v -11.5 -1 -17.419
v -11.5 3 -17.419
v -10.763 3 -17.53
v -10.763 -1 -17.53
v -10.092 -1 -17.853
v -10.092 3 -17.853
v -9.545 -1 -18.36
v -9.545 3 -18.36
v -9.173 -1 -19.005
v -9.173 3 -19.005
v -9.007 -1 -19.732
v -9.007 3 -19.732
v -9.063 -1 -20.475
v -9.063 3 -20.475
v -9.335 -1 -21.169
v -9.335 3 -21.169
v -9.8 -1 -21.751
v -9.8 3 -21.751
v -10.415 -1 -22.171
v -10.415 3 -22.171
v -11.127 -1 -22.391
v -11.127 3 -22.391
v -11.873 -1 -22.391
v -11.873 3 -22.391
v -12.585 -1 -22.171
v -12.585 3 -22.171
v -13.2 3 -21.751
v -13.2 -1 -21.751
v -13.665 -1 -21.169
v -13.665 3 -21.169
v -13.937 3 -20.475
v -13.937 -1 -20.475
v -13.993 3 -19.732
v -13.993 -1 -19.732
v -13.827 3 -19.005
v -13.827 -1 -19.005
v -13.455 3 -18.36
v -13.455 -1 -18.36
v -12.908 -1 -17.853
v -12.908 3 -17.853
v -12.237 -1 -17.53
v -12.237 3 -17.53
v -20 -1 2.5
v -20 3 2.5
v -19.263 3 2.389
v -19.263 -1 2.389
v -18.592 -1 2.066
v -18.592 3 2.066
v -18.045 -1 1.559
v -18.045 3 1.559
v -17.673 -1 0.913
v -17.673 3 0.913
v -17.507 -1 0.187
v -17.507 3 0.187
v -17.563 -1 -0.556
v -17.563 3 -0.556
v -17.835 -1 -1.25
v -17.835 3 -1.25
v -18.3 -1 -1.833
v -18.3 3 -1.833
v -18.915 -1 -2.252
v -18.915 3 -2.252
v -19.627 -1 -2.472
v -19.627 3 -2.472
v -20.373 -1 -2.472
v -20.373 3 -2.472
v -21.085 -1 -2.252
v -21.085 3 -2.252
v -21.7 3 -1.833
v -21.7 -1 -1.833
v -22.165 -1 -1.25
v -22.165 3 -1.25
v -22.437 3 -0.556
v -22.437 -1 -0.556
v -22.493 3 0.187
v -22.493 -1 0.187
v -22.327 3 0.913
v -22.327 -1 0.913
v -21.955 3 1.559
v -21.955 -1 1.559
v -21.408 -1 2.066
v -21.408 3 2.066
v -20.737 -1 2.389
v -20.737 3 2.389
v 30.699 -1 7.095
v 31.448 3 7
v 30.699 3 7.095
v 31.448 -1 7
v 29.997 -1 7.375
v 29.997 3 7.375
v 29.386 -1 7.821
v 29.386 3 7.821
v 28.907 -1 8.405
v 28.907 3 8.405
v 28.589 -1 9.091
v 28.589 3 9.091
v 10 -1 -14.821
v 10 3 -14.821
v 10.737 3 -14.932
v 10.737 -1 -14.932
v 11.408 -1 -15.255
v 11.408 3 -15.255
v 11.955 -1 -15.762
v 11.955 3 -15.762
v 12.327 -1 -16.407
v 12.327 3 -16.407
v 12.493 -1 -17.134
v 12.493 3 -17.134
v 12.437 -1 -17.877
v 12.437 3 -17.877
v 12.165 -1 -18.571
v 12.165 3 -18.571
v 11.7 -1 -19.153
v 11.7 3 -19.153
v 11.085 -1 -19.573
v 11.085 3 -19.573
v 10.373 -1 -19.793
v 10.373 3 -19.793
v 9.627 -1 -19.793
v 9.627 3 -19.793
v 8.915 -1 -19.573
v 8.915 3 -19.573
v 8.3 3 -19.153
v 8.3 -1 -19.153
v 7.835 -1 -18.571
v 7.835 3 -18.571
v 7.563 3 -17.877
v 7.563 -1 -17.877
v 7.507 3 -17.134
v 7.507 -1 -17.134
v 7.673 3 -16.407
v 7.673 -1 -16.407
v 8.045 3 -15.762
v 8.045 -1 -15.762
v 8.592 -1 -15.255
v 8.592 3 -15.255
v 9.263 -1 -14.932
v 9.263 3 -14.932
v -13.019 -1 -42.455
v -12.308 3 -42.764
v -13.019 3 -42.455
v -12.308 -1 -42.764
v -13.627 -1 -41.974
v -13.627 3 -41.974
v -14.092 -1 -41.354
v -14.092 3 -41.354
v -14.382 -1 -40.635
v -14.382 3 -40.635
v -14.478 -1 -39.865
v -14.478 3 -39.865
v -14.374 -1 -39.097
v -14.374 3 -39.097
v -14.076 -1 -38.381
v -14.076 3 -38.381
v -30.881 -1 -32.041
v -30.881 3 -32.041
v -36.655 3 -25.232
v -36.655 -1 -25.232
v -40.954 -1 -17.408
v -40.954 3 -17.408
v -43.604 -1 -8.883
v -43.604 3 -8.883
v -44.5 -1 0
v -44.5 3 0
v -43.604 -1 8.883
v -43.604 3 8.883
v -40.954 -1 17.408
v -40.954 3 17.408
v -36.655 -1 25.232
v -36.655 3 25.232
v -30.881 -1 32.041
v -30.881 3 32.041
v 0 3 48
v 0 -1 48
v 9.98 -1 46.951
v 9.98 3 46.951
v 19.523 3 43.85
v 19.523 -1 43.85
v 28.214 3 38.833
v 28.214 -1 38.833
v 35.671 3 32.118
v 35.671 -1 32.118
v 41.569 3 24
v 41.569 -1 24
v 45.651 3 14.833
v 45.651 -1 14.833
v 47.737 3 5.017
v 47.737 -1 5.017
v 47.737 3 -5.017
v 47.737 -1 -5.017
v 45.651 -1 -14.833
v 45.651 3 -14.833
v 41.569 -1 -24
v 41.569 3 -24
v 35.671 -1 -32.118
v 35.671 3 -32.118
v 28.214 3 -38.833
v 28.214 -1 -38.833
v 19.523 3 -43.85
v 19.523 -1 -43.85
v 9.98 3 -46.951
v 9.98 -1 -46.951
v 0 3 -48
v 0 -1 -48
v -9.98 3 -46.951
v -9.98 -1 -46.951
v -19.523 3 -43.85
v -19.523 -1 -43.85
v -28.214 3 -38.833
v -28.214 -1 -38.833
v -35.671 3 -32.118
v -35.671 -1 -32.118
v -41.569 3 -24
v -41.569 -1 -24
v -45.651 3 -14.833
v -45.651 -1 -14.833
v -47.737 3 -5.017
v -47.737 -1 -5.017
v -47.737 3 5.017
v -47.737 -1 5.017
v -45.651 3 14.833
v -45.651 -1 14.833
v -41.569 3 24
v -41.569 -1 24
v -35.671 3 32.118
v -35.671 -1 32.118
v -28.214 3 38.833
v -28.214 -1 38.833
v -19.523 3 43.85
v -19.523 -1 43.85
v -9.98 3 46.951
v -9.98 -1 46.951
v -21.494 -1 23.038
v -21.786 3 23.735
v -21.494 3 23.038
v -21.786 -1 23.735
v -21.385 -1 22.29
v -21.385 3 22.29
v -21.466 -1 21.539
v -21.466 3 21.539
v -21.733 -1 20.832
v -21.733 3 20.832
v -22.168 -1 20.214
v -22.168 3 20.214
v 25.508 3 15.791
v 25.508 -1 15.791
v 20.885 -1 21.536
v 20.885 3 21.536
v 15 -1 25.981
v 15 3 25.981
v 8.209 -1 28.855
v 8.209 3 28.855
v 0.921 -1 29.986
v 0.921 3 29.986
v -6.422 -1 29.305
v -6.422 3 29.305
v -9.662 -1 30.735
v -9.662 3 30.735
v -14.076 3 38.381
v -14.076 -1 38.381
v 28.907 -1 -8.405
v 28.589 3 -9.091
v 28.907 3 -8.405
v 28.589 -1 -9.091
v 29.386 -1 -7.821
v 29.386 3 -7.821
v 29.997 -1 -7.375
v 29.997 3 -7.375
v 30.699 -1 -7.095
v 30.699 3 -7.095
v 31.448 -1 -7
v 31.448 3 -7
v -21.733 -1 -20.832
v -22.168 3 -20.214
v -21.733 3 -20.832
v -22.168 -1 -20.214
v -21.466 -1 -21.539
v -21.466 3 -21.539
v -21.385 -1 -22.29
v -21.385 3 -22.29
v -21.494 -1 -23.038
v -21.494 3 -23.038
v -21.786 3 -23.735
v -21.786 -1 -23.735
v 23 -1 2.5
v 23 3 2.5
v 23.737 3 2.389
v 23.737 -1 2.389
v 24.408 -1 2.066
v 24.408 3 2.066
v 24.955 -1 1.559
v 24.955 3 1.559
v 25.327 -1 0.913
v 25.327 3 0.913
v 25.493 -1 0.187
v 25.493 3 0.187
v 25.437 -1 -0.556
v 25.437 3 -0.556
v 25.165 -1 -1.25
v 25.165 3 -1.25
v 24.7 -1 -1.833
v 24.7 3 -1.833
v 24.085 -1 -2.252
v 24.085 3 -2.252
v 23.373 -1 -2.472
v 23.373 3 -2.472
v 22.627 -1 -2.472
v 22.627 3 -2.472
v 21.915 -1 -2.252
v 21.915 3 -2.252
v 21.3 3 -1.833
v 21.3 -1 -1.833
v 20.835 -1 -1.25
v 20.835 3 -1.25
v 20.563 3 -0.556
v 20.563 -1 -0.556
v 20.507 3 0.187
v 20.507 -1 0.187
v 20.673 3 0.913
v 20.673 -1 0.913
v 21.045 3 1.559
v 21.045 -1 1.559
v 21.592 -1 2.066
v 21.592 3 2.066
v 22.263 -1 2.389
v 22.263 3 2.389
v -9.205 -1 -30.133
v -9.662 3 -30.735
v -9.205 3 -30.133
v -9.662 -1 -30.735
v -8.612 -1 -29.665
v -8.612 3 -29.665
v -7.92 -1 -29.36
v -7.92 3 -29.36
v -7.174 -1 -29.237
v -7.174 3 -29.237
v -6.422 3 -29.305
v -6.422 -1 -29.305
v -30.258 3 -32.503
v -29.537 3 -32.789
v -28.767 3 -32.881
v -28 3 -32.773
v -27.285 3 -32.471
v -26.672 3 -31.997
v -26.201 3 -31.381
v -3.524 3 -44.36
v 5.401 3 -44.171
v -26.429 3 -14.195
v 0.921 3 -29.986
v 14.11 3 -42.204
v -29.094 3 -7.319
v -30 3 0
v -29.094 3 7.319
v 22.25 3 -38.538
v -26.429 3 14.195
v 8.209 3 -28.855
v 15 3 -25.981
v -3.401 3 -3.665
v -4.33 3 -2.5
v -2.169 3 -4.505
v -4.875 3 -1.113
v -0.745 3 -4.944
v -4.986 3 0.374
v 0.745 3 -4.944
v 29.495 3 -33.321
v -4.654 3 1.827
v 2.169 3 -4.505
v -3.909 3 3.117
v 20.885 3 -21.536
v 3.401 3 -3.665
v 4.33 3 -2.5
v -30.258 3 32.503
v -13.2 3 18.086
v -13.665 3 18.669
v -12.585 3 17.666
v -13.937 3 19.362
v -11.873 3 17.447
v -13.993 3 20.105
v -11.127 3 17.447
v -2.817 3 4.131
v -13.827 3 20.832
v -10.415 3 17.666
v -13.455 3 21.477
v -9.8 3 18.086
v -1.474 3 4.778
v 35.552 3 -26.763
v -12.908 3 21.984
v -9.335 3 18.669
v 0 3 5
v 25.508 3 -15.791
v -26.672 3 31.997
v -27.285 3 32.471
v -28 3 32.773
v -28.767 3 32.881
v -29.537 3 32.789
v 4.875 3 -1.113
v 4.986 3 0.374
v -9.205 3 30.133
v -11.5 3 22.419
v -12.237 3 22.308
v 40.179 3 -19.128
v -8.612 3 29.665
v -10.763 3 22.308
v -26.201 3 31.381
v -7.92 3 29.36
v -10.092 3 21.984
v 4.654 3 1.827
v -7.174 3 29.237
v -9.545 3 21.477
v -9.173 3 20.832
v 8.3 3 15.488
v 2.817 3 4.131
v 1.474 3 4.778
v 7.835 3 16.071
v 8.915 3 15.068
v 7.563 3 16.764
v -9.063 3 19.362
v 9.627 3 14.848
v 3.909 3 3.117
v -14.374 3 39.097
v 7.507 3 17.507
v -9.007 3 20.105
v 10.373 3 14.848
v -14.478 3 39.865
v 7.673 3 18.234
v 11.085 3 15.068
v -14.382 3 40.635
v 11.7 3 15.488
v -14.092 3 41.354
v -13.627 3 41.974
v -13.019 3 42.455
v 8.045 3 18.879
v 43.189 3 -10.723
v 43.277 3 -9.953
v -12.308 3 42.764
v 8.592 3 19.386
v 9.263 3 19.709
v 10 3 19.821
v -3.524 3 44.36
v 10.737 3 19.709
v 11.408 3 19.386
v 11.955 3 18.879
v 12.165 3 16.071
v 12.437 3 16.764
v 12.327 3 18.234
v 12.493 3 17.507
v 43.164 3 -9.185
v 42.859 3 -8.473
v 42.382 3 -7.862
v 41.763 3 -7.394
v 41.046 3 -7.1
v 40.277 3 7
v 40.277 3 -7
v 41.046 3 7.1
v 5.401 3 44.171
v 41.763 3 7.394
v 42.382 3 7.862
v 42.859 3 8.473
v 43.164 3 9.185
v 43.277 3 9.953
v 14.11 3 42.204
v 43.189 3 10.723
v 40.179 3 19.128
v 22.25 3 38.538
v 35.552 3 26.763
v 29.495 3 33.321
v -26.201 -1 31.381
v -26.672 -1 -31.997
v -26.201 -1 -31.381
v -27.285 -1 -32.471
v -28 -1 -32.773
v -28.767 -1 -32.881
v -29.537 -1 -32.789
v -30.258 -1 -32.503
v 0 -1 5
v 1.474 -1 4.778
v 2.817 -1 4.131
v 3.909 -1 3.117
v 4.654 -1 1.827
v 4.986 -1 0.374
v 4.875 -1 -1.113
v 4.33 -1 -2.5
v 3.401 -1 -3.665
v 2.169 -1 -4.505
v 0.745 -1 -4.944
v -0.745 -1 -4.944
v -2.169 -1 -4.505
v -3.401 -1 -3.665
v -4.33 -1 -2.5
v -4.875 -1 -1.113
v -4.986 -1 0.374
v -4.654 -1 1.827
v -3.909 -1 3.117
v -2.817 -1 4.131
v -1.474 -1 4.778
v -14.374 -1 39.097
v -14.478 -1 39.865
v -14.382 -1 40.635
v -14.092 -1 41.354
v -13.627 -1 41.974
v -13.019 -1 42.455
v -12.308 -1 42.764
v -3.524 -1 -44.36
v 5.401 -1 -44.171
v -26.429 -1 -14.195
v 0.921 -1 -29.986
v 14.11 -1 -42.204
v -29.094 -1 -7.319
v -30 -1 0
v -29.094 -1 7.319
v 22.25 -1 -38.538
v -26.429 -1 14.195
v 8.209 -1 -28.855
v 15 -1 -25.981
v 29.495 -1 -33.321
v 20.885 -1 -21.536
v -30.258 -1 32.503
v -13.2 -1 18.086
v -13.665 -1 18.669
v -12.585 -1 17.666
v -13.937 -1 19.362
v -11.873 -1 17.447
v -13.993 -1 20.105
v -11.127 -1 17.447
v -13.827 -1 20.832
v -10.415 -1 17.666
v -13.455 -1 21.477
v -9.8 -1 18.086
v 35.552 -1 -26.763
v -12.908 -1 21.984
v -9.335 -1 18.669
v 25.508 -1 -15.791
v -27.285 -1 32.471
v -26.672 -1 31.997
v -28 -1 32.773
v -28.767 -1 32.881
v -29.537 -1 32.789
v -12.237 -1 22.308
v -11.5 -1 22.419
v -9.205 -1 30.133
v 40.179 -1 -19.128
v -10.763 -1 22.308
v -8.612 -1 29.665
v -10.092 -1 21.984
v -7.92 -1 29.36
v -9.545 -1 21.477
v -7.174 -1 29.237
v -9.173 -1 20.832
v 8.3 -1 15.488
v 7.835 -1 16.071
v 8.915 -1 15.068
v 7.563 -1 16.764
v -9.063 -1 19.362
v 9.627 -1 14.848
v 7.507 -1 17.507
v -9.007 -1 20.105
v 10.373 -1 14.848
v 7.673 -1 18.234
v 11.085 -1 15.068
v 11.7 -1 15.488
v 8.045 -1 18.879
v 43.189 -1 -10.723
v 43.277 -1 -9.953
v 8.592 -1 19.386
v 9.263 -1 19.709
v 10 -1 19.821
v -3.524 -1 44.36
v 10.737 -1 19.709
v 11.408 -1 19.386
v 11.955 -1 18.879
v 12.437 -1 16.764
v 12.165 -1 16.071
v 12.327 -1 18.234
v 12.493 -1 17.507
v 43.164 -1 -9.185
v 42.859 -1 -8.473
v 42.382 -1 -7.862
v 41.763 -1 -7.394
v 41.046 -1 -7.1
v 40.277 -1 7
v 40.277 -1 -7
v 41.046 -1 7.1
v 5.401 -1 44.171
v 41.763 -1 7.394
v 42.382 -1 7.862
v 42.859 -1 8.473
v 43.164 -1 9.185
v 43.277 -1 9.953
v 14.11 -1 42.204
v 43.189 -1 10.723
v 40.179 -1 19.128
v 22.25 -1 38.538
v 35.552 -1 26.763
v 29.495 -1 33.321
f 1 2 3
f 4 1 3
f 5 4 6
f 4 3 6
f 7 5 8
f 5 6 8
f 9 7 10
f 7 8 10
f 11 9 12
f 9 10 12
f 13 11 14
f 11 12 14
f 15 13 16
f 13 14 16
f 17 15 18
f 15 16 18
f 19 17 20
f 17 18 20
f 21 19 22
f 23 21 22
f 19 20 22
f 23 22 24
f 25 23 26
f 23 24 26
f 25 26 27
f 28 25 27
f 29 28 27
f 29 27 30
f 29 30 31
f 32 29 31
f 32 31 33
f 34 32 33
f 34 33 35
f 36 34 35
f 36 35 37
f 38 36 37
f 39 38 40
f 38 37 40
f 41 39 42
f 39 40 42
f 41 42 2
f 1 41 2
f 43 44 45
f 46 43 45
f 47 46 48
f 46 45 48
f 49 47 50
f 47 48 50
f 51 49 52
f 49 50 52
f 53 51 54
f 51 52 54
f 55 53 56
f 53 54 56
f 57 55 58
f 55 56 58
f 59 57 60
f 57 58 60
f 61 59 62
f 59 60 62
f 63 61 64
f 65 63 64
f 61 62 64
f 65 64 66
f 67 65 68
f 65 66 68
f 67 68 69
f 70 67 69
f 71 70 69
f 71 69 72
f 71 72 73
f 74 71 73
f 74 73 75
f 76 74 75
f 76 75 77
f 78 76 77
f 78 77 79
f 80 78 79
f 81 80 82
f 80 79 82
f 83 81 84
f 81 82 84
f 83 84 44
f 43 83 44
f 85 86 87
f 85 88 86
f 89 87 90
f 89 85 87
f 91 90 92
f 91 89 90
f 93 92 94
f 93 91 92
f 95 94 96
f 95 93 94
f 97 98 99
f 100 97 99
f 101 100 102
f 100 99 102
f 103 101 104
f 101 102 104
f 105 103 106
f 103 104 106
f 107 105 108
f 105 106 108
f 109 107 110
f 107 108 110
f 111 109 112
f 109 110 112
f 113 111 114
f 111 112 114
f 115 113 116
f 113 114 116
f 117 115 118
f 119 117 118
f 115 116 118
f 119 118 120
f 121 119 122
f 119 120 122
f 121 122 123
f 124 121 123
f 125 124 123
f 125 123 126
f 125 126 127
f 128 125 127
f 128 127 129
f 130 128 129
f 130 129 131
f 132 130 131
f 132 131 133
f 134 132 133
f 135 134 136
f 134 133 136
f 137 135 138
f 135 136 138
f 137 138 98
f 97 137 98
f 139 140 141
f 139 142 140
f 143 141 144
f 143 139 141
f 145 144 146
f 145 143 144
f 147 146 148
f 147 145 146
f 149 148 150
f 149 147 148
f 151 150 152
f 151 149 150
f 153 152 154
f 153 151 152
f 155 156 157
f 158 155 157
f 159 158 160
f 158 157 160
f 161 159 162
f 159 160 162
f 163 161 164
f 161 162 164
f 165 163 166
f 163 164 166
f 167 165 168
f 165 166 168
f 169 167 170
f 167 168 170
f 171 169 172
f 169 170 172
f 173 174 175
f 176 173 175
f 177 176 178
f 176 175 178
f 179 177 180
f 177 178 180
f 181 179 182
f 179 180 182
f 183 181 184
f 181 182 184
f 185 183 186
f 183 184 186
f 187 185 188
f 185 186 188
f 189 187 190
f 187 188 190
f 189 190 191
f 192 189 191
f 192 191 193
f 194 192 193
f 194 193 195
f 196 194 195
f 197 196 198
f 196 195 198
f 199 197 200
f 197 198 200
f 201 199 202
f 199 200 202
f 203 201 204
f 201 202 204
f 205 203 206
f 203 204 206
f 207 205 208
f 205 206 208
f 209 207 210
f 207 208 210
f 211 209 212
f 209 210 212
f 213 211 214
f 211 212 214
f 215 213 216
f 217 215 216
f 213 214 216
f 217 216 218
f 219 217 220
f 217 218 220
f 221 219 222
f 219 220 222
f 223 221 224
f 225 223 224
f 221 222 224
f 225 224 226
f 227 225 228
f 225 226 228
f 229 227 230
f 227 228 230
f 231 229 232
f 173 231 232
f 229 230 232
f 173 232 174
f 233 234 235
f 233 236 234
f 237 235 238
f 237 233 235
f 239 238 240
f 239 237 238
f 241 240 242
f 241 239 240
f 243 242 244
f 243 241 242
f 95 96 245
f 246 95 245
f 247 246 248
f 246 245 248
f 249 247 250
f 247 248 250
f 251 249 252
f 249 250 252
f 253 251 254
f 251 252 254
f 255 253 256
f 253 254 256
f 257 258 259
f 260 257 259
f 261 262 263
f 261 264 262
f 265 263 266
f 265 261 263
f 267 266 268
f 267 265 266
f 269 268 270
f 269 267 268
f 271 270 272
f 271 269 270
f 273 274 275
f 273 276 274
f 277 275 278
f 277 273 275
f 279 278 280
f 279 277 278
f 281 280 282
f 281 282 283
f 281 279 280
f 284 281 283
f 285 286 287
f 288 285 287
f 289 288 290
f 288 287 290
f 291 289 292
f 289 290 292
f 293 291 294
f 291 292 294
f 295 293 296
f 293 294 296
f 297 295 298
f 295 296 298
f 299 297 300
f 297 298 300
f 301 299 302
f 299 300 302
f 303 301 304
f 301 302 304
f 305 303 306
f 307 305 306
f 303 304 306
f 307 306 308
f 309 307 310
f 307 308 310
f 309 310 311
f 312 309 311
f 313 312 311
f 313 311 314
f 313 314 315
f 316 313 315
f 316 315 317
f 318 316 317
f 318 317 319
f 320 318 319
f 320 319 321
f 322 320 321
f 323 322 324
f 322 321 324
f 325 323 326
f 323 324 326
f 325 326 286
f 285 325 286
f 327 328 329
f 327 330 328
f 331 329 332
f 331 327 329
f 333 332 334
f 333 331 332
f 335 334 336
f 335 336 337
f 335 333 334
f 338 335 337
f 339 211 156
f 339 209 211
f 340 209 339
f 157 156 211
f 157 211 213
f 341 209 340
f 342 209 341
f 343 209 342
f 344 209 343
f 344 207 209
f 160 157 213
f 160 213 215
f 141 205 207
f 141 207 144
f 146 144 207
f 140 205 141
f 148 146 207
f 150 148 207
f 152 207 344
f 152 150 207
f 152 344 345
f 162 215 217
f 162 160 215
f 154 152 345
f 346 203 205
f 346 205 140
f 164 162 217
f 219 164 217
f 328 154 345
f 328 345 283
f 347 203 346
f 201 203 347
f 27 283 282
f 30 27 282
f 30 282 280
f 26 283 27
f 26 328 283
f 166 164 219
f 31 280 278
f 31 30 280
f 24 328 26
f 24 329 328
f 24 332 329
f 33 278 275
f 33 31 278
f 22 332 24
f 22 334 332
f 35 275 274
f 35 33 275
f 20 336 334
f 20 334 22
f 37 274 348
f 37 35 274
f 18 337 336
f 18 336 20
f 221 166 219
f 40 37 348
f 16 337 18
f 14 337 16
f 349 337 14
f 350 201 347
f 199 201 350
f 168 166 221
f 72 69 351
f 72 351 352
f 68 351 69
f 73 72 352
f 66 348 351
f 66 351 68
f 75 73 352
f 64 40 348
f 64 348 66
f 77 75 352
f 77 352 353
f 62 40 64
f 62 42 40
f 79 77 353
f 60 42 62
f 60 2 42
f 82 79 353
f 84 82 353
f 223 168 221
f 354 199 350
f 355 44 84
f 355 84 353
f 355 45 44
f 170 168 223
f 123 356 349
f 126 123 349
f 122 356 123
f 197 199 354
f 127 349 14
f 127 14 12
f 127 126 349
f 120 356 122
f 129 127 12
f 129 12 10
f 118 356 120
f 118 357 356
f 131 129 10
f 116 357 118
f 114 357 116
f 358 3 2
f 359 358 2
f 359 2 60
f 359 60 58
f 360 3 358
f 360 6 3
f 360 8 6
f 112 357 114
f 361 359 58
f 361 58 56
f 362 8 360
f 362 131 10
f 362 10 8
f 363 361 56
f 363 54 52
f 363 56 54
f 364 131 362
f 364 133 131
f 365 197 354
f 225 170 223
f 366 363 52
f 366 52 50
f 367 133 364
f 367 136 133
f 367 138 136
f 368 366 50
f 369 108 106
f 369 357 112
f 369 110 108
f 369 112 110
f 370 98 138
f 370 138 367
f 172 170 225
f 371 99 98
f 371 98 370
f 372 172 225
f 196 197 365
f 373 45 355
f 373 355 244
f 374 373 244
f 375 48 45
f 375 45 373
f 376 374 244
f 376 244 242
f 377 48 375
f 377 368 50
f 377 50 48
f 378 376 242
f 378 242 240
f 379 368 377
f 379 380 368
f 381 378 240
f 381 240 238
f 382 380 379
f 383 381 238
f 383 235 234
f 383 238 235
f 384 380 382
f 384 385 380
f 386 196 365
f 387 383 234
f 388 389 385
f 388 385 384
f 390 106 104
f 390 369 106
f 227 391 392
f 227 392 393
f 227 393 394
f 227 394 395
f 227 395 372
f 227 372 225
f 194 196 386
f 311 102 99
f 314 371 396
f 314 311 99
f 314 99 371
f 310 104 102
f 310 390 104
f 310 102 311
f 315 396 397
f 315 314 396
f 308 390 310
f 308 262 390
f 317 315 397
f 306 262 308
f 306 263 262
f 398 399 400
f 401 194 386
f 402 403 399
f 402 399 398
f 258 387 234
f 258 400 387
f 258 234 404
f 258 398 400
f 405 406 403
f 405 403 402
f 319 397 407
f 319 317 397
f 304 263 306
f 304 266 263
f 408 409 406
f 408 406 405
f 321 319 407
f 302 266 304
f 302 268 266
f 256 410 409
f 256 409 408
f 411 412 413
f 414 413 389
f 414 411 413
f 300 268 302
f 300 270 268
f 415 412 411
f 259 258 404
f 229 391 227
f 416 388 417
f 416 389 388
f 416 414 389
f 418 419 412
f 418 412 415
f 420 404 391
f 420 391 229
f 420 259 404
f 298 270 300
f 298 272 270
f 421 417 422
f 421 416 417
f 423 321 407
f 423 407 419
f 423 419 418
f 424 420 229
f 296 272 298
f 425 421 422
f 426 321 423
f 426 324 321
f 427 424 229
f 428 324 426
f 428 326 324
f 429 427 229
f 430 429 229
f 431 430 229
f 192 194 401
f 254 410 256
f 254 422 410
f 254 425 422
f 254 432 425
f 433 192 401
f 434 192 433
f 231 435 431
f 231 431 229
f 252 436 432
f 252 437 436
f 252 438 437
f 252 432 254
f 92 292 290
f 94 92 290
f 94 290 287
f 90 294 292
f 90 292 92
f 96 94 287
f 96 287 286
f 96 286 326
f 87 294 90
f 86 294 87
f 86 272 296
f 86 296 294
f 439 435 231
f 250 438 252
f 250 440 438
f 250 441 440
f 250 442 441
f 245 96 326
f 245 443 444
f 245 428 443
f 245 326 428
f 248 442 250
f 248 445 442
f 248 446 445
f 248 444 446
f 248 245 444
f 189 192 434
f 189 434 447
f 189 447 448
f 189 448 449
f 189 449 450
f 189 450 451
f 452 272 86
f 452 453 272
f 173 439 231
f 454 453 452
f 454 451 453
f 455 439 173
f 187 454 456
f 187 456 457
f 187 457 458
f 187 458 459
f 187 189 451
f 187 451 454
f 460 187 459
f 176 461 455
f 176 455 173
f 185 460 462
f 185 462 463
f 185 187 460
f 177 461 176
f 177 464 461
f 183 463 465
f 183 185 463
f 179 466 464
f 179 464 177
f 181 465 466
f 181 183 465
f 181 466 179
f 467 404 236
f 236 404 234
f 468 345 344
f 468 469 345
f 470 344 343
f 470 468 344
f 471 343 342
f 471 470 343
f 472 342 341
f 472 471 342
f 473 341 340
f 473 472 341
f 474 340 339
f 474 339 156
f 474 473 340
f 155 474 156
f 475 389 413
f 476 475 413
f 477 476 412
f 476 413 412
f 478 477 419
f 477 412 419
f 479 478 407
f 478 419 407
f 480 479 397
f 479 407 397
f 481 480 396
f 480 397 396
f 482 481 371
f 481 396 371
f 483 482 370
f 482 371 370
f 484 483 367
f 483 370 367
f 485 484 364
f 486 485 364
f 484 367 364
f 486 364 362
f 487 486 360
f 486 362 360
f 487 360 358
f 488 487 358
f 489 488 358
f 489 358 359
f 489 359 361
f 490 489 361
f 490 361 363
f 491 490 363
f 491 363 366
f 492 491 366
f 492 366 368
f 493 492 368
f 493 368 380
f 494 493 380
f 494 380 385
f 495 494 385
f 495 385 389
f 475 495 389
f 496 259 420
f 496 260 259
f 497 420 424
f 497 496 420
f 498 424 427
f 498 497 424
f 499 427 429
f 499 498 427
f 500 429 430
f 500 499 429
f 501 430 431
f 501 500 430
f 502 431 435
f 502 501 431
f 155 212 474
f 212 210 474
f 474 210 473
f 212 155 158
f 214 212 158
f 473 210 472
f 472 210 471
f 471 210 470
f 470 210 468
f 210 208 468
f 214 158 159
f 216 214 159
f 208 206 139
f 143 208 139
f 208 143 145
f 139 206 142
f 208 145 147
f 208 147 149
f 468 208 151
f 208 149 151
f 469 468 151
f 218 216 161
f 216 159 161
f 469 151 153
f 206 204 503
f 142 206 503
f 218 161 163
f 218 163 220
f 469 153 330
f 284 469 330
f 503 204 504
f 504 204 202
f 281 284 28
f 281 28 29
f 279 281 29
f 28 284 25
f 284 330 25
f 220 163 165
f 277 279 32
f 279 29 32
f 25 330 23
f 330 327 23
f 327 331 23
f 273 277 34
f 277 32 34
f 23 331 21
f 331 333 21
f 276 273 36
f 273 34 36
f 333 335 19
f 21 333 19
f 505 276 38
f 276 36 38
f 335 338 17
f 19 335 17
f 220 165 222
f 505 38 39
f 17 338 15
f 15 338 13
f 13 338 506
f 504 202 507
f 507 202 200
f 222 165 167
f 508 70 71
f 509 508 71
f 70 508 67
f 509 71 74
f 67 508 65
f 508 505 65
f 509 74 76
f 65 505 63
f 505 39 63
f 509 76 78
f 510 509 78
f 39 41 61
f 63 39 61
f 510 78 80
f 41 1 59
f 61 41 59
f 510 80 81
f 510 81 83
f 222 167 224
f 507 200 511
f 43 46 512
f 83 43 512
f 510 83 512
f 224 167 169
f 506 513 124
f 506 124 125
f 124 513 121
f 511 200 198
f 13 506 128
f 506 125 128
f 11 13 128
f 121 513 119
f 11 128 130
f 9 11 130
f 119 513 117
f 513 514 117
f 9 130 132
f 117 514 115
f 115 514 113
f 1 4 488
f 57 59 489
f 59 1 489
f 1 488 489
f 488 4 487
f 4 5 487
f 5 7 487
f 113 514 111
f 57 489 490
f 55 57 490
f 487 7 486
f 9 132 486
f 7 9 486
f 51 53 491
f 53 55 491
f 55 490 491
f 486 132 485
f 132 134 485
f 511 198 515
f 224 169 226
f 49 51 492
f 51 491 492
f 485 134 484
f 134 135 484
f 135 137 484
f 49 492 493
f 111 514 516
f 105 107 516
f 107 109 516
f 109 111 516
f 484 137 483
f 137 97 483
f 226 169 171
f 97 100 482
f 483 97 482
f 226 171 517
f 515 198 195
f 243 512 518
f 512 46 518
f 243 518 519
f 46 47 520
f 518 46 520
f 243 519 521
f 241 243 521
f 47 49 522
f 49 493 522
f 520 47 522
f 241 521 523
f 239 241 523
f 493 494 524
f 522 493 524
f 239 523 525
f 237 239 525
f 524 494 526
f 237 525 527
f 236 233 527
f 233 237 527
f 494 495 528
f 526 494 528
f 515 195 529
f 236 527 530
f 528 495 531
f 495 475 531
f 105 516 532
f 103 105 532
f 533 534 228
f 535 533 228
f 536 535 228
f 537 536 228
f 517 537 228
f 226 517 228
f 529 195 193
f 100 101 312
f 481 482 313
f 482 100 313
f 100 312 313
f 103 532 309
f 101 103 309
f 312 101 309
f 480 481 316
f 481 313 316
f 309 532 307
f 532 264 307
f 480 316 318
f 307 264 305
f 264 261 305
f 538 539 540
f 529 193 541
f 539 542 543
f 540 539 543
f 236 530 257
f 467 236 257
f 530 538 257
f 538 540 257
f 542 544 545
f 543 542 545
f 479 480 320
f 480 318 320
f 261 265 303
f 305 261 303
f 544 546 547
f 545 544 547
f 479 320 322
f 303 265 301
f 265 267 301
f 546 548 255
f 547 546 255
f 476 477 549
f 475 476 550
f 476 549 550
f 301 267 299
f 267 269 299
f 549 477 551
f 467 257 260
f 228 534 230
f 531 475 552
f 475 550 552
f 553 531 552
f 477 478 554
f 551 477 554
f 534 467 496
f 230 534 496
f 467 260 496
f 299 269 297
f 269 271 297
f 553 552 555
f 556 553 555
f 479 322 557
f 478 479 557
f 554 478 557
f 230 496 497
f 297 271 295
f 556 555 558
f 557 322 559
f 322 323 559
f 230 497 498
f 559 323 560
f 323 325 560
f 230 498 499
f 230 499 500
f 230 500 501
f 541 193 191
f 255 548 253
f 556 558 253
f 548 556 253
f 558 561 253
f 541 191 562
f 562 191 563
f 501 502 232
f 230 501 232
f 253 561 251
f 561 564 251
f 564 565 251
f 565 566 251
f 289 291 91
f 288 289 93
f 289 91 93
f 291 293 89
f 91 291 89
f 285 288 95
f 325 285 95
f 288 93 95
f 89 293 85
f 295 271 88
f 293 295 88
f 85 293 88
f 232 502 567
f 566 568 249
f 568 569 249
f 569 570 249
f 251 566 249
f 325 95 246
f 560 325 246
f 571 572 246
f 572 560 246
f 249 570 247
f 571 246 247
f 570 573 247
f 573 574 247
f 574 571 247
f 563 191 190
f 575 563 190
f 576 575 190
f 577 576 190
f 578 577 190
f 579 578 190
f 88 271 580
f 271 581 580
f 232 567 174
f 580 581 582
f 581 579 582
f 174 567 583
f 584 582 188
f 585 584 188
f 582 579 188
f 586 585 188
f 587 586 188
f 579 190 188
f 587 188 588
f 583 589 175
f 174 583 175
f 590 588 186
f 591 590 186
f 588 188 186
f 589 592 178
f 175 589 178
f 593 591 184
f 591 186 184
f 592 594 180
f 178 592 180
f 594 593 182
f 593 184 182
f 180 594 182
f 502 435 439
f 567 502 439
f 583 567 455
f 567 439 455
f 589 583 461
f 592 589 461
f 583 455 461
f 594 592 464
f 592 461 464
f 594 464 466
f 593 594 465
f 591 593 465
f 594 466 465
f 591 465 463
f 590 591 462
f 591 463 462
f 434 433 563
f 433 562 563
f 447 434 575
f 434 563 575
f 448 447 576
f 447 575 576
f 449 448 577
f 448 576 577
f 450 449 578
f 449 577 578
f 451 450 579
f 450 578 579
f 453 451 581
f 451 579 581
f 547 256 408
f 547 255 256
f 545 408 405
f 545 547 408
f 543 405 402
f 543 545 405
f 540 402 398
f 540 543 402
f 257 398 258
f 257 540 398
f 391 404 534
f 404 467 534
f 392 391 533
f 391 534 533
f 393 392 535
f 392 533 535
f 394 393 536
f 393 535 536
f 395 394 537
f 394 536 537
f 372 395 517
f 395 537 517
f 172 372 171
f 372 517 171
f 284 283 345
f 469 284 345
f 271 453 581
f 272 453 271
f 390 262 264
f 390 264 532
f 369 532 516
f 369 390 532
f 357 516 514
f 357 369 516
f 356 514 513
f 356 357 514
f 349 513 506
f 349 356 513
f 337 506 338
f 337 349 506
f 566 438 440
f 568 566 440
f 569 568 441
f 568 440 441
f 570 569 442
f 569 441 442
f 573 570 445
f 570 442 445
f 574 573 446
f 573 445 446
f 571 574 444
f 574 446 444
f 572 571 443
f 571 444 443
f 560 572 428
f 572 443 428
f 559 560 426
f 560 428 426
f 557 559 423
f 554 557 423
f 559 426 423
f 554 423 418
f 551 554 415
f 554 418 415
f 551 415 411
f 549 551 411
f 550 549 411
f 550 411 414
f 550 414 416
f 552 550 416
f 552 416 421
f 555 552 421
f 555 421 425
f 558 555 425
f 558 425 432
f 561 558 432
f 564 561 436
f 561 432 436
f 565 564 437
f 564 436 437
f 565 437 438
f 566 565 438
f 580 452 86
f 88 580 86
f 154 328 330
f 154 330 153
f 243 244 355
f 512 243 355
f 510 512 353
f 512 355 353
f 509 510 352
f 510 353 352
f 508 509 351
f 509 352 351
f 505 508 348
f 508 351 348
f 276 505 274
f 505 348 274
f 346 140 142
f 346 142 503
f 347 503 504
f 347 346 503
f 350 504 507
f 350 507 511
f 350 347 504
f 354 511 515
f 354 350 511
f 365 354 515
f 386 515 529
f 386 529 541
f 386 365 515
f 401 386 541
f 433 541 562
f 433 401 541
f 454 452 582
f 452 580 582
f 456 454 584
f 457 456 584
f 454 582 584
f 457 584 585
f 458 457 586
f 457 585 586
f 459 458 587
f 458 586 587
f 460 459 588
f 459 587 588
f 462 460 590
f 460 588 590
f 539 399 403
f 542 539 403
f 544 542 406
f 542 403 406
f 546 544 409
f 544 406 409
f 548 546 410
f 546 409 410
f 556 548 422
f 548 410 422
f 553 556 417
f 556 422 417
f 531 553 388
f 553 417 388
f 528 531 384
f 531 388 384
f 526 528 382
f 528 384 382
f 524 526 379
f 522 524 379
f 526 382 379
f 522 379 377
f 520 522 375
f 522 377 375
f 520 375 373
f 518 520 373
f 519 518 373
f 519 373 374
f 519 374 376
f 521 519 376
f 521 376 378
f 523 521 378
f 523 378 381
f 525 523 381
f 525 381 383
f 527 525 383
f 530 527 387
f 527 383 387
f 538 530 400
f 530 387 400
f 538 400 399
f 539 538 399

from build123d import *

# Parameters (mm, degrees)
SKETCH1_R           = 24
SKETCH1_R_2         = 2
SKETCH1_R_3         = 1.5
BOSS_EXTRUDE1_DEPTH = 2
CUT_EXTRUDE1_DEPTH  = 2
FILLET1_R           = 1.5
SKETCH3_R           = 1.75
CUT_EXTRUDE2_DEPTH  = 10
SCALE1_SCALE        = 2
SKETCH4_R           = 5
CUT_EXTRUDE3_DEPTH  = 10
SKETCH5_R           = 6.547213639
SKETCH5_R_2         = 2.5
SKETCH5_R_3         = 5.064875416
BOSS_EXTRUDE2_DEPTH = 4


with BuildPart() as part:
    # Sketch1 → Boss-Extrude1 (new body)
    with BuildSketch(Plane(origin=(0, 0, 0), x_dir=(1, 0, 0), z_dir=(0, 1, 0))):
        with Locations(Location((0, 0, 0), (0, 0, 270))):
            Circle(SKETCH1_R)
        with Locations(Location((0, 0, 0), (0, 0, 270))):
            Circle(SKETCH1_R_2, mode=Mode.SUBTRACT)
        with Locations(Location((11.5, 0, 0), (0, 0, 270))):
            Circle(SKETCH1_R_3, mode=Mode.SUBTRACT)
        with Locations(Location((-5.75, -9.959292144, 0), (0, 0, 270))):
            Circle(SKETCH1_R_3, mode=Mode.SUBTRACT)
        with Locations(Location((-5.75, 9.959292144, 0), (0, 0, 270))):
            Circle(SKETCH1_R_3, mode=Mode.SUBTRACT)
    extrude(amount=BOSS_EXTRUDE1_DEPTH)

    # Sketch2 → Cut-Extrude1 (cut)
    with BuildSketch(Plane(origin=(0, 2, 0), x_dir=(1, 0, 0), z_dir=(0, 1, 0))):
        with BuildLine():
            Line((21.972994789, 3.5), (14.585952146, 3.5))
            ThreePointArc((14.585952146, 3.5), (7.5, 12.990381057), (-4.26188716, 14.381805097))
            Line((-4.26188716, 14.381805097), (-7.955408481, 20.779171685))
            ThreePointArc((-7.955408481, 20.779171685), (11.125, 19.269065234), (21.972994789, 3.5))
        make_face()
        with BuildLine():
            Line((21.972994789, -3.5), (14.585952146, -3.5))
            ThreePointArc((14.585952146, -3.5), (7.5, -12.990381057), (-4.26188716, -14.381805097))
            Line((-4.26188716, -14.381805097), (-7.955408481, -20.779171685))
            ThreePointArc((-7.955408481, -20.779171685), (11.125, -19.269065234), (21.972994789, -3.5))
        make_face()
        with BuildLine():
            Line((-14.017586308, -17.279171685), (-10.324064986, -10.881805097))
            ThreePointArc((-10.324064986, -10.881805097), (-15, 0), (-10.324064986, 10.881805097))
            Line((-10.324064986, 10.881805097), (-14.017586308, 17.279171685))
            ThreePointArc((-14.017586308, 17.279171685), (-22.25, 0), (-14.017586308, -17.279171685))
        make_face()
    extrude(amount=-CUT_EXTRUDE1_DEPTH, mode=Mode.SUBTRACT)

    # Fillet1
    fillet1_edges = [part.edges().sort_by_distance(p)[0] for p in [
        (-7.955408481, 1, -20.779171685),
        (21.972994789, 1, -3.5),
        (14.585952146, 1, -3.5),
        (-4.26188716, 1, -14.381805097),
        (-14.017586308, 1, 17.279171685),
        (-14.017586308, 1, -17.279171685),
        (-10.324064986, 1, -10.881805097),
        (-10.324064986, 1, 10.881805097),
        (21.972994789, 1, 3.5),
        (-7.955408481, 1, 20.779171685),
        (-4.26188716, 1, 14.381805097),
        (14.585952146, 1, 3.5),
    ]]
    fillet(fillet1_edges, radius=FILLET1_R)

    # Sketch3 → Cut-Extrude2 (cut)
    with BuildSketch(Plane(origin=(0, 2, 0), x_dir=(1, 0, 0), z_dir=(0, 1, 0))):
        with Locations(Location((5, 8.660254038, 0), (0, 0, 270))):
            Circle(SKETCH3_R)
        with Locations(Location((5, -8.660254038, 0), (0, 0, 270))):
            Circle(SKETCH3_R)
        with Locations(Location((-10, 0, 0), (0, 0, 270))):
            Circle(SKETCH3_R)
    extrude(amount=-CUT_EXTRUDE2_DEPTH, mode=Mode.SUBTRACT)


with BuildPart() as part_1:
    # Scale1: scaled about (0, 1, 0)
    add(part.part.scale(SCALE1_SCALE).moved(Location((0, -1, 0))))

    # Sketch4 → Cut-Extrude3 (cut)
    with BuildSketch(Plane(origin=(0, 3, 0), x_dir=(1, 0, 0), z_dir=(0, 1, 0))):
        with Locations(Location((0, 0, 0), (0, 0, 270))):
            Circle(SKETCH4_R)
    extrude(amount=-CUT_EXTRUDE3_DEPTH, mode=Mode.SUBTRACT)

    # Sketch5 → Boss-Extrude2 (add)
    # profile 1 of 6: a face of its own
    with BuildSketch(Plane(origin=(0, 3, 0), x_dir=(1, 0, 0), z_dir=(0, 1, 0))):
        with Locations((10, 17.320508076)):
            Circle(SKETCH5_R)
        with Locations(Location((10, 17.320508076, 0), (0, 0, 270))):
            Circle(SKETCH5_R_2, mode=Mode.SUBTRACT)
    # profile 2 of 6: a face of its own
    with BuildSketch(Plane(origin=(0, 3, 0), x_dir=(1, 0, 0), z_dir=(0, 1, 0))):
        with Locations((10, -17.320508076)):
            Circle(SKETCH5_R)
        with Locations(Location((10, -17.320508076, 0), (0, 0, 270))):
            Circle(SKETCH5_R_2, mode=Mode.SUBTRACT)
    # profile 3 of 6: a face of its own
    with BuildSketch(Plane(origin=(0, 3, 0), x_dir=(1, 0, 0), z_dir=(0, 1, 0))):
        with Locations((-20, 0)):
            Circle(SKETCH5_R)
        with Locations(Location((-20, 0, 0), (0, 0, 270))):
            Circle(SKETCH5_R_2, mode=Mode.SUBTRACT)
    # profile 4 of 6: a face of its own
    with BuildSketch(Plane(origin=(0, 3, 0), x_dir=(1, 0, 0), z_dir=(0, 1, 0))):
        with Locations((-11.5, 19.918584287)):
            Circle(SKETCH5_R_3)
        with Locations(Location((-11.5, 19.918584287, 0), (0, 0, 270))):
            Circle(SKETCH5_R_2, mode=Mode.SUBTRACT)
    # profile 5 of 6: a face of its own
    with BuildSketch(Plane(origin=(0, 3, 0), x_dir=(1, 0, 0), z_dir=(0, 1, 0))):
        with Locations((23, 0)):
            Circle(SKETCH5_R_3)
        with Locations(Location((23, 0, 0), (0, 0, 270))):
            Circle(SKETCH5_R_2, mode=Mode.SUBTRACT)
    # profile 6 of 6: a face of its own
    with BuildSketch(Plane(origin=(0, 3, 0), x_dir=(1, 0, 0), z_dir=(0, 1, 0))):
        with Locations((-11.5, -19.918584287)):
            Circle(SKETCH5_R_3)
        with Locations(Location((-11.5, -19.918584287, 0), (0, 0, 270))):
            Circle(SKETCH5_R_2, mode=Mode.SUBTRACT)
    extrude(amount=-BOSS_EXTRUDE2_DEPTH)


solid = part_1.part
